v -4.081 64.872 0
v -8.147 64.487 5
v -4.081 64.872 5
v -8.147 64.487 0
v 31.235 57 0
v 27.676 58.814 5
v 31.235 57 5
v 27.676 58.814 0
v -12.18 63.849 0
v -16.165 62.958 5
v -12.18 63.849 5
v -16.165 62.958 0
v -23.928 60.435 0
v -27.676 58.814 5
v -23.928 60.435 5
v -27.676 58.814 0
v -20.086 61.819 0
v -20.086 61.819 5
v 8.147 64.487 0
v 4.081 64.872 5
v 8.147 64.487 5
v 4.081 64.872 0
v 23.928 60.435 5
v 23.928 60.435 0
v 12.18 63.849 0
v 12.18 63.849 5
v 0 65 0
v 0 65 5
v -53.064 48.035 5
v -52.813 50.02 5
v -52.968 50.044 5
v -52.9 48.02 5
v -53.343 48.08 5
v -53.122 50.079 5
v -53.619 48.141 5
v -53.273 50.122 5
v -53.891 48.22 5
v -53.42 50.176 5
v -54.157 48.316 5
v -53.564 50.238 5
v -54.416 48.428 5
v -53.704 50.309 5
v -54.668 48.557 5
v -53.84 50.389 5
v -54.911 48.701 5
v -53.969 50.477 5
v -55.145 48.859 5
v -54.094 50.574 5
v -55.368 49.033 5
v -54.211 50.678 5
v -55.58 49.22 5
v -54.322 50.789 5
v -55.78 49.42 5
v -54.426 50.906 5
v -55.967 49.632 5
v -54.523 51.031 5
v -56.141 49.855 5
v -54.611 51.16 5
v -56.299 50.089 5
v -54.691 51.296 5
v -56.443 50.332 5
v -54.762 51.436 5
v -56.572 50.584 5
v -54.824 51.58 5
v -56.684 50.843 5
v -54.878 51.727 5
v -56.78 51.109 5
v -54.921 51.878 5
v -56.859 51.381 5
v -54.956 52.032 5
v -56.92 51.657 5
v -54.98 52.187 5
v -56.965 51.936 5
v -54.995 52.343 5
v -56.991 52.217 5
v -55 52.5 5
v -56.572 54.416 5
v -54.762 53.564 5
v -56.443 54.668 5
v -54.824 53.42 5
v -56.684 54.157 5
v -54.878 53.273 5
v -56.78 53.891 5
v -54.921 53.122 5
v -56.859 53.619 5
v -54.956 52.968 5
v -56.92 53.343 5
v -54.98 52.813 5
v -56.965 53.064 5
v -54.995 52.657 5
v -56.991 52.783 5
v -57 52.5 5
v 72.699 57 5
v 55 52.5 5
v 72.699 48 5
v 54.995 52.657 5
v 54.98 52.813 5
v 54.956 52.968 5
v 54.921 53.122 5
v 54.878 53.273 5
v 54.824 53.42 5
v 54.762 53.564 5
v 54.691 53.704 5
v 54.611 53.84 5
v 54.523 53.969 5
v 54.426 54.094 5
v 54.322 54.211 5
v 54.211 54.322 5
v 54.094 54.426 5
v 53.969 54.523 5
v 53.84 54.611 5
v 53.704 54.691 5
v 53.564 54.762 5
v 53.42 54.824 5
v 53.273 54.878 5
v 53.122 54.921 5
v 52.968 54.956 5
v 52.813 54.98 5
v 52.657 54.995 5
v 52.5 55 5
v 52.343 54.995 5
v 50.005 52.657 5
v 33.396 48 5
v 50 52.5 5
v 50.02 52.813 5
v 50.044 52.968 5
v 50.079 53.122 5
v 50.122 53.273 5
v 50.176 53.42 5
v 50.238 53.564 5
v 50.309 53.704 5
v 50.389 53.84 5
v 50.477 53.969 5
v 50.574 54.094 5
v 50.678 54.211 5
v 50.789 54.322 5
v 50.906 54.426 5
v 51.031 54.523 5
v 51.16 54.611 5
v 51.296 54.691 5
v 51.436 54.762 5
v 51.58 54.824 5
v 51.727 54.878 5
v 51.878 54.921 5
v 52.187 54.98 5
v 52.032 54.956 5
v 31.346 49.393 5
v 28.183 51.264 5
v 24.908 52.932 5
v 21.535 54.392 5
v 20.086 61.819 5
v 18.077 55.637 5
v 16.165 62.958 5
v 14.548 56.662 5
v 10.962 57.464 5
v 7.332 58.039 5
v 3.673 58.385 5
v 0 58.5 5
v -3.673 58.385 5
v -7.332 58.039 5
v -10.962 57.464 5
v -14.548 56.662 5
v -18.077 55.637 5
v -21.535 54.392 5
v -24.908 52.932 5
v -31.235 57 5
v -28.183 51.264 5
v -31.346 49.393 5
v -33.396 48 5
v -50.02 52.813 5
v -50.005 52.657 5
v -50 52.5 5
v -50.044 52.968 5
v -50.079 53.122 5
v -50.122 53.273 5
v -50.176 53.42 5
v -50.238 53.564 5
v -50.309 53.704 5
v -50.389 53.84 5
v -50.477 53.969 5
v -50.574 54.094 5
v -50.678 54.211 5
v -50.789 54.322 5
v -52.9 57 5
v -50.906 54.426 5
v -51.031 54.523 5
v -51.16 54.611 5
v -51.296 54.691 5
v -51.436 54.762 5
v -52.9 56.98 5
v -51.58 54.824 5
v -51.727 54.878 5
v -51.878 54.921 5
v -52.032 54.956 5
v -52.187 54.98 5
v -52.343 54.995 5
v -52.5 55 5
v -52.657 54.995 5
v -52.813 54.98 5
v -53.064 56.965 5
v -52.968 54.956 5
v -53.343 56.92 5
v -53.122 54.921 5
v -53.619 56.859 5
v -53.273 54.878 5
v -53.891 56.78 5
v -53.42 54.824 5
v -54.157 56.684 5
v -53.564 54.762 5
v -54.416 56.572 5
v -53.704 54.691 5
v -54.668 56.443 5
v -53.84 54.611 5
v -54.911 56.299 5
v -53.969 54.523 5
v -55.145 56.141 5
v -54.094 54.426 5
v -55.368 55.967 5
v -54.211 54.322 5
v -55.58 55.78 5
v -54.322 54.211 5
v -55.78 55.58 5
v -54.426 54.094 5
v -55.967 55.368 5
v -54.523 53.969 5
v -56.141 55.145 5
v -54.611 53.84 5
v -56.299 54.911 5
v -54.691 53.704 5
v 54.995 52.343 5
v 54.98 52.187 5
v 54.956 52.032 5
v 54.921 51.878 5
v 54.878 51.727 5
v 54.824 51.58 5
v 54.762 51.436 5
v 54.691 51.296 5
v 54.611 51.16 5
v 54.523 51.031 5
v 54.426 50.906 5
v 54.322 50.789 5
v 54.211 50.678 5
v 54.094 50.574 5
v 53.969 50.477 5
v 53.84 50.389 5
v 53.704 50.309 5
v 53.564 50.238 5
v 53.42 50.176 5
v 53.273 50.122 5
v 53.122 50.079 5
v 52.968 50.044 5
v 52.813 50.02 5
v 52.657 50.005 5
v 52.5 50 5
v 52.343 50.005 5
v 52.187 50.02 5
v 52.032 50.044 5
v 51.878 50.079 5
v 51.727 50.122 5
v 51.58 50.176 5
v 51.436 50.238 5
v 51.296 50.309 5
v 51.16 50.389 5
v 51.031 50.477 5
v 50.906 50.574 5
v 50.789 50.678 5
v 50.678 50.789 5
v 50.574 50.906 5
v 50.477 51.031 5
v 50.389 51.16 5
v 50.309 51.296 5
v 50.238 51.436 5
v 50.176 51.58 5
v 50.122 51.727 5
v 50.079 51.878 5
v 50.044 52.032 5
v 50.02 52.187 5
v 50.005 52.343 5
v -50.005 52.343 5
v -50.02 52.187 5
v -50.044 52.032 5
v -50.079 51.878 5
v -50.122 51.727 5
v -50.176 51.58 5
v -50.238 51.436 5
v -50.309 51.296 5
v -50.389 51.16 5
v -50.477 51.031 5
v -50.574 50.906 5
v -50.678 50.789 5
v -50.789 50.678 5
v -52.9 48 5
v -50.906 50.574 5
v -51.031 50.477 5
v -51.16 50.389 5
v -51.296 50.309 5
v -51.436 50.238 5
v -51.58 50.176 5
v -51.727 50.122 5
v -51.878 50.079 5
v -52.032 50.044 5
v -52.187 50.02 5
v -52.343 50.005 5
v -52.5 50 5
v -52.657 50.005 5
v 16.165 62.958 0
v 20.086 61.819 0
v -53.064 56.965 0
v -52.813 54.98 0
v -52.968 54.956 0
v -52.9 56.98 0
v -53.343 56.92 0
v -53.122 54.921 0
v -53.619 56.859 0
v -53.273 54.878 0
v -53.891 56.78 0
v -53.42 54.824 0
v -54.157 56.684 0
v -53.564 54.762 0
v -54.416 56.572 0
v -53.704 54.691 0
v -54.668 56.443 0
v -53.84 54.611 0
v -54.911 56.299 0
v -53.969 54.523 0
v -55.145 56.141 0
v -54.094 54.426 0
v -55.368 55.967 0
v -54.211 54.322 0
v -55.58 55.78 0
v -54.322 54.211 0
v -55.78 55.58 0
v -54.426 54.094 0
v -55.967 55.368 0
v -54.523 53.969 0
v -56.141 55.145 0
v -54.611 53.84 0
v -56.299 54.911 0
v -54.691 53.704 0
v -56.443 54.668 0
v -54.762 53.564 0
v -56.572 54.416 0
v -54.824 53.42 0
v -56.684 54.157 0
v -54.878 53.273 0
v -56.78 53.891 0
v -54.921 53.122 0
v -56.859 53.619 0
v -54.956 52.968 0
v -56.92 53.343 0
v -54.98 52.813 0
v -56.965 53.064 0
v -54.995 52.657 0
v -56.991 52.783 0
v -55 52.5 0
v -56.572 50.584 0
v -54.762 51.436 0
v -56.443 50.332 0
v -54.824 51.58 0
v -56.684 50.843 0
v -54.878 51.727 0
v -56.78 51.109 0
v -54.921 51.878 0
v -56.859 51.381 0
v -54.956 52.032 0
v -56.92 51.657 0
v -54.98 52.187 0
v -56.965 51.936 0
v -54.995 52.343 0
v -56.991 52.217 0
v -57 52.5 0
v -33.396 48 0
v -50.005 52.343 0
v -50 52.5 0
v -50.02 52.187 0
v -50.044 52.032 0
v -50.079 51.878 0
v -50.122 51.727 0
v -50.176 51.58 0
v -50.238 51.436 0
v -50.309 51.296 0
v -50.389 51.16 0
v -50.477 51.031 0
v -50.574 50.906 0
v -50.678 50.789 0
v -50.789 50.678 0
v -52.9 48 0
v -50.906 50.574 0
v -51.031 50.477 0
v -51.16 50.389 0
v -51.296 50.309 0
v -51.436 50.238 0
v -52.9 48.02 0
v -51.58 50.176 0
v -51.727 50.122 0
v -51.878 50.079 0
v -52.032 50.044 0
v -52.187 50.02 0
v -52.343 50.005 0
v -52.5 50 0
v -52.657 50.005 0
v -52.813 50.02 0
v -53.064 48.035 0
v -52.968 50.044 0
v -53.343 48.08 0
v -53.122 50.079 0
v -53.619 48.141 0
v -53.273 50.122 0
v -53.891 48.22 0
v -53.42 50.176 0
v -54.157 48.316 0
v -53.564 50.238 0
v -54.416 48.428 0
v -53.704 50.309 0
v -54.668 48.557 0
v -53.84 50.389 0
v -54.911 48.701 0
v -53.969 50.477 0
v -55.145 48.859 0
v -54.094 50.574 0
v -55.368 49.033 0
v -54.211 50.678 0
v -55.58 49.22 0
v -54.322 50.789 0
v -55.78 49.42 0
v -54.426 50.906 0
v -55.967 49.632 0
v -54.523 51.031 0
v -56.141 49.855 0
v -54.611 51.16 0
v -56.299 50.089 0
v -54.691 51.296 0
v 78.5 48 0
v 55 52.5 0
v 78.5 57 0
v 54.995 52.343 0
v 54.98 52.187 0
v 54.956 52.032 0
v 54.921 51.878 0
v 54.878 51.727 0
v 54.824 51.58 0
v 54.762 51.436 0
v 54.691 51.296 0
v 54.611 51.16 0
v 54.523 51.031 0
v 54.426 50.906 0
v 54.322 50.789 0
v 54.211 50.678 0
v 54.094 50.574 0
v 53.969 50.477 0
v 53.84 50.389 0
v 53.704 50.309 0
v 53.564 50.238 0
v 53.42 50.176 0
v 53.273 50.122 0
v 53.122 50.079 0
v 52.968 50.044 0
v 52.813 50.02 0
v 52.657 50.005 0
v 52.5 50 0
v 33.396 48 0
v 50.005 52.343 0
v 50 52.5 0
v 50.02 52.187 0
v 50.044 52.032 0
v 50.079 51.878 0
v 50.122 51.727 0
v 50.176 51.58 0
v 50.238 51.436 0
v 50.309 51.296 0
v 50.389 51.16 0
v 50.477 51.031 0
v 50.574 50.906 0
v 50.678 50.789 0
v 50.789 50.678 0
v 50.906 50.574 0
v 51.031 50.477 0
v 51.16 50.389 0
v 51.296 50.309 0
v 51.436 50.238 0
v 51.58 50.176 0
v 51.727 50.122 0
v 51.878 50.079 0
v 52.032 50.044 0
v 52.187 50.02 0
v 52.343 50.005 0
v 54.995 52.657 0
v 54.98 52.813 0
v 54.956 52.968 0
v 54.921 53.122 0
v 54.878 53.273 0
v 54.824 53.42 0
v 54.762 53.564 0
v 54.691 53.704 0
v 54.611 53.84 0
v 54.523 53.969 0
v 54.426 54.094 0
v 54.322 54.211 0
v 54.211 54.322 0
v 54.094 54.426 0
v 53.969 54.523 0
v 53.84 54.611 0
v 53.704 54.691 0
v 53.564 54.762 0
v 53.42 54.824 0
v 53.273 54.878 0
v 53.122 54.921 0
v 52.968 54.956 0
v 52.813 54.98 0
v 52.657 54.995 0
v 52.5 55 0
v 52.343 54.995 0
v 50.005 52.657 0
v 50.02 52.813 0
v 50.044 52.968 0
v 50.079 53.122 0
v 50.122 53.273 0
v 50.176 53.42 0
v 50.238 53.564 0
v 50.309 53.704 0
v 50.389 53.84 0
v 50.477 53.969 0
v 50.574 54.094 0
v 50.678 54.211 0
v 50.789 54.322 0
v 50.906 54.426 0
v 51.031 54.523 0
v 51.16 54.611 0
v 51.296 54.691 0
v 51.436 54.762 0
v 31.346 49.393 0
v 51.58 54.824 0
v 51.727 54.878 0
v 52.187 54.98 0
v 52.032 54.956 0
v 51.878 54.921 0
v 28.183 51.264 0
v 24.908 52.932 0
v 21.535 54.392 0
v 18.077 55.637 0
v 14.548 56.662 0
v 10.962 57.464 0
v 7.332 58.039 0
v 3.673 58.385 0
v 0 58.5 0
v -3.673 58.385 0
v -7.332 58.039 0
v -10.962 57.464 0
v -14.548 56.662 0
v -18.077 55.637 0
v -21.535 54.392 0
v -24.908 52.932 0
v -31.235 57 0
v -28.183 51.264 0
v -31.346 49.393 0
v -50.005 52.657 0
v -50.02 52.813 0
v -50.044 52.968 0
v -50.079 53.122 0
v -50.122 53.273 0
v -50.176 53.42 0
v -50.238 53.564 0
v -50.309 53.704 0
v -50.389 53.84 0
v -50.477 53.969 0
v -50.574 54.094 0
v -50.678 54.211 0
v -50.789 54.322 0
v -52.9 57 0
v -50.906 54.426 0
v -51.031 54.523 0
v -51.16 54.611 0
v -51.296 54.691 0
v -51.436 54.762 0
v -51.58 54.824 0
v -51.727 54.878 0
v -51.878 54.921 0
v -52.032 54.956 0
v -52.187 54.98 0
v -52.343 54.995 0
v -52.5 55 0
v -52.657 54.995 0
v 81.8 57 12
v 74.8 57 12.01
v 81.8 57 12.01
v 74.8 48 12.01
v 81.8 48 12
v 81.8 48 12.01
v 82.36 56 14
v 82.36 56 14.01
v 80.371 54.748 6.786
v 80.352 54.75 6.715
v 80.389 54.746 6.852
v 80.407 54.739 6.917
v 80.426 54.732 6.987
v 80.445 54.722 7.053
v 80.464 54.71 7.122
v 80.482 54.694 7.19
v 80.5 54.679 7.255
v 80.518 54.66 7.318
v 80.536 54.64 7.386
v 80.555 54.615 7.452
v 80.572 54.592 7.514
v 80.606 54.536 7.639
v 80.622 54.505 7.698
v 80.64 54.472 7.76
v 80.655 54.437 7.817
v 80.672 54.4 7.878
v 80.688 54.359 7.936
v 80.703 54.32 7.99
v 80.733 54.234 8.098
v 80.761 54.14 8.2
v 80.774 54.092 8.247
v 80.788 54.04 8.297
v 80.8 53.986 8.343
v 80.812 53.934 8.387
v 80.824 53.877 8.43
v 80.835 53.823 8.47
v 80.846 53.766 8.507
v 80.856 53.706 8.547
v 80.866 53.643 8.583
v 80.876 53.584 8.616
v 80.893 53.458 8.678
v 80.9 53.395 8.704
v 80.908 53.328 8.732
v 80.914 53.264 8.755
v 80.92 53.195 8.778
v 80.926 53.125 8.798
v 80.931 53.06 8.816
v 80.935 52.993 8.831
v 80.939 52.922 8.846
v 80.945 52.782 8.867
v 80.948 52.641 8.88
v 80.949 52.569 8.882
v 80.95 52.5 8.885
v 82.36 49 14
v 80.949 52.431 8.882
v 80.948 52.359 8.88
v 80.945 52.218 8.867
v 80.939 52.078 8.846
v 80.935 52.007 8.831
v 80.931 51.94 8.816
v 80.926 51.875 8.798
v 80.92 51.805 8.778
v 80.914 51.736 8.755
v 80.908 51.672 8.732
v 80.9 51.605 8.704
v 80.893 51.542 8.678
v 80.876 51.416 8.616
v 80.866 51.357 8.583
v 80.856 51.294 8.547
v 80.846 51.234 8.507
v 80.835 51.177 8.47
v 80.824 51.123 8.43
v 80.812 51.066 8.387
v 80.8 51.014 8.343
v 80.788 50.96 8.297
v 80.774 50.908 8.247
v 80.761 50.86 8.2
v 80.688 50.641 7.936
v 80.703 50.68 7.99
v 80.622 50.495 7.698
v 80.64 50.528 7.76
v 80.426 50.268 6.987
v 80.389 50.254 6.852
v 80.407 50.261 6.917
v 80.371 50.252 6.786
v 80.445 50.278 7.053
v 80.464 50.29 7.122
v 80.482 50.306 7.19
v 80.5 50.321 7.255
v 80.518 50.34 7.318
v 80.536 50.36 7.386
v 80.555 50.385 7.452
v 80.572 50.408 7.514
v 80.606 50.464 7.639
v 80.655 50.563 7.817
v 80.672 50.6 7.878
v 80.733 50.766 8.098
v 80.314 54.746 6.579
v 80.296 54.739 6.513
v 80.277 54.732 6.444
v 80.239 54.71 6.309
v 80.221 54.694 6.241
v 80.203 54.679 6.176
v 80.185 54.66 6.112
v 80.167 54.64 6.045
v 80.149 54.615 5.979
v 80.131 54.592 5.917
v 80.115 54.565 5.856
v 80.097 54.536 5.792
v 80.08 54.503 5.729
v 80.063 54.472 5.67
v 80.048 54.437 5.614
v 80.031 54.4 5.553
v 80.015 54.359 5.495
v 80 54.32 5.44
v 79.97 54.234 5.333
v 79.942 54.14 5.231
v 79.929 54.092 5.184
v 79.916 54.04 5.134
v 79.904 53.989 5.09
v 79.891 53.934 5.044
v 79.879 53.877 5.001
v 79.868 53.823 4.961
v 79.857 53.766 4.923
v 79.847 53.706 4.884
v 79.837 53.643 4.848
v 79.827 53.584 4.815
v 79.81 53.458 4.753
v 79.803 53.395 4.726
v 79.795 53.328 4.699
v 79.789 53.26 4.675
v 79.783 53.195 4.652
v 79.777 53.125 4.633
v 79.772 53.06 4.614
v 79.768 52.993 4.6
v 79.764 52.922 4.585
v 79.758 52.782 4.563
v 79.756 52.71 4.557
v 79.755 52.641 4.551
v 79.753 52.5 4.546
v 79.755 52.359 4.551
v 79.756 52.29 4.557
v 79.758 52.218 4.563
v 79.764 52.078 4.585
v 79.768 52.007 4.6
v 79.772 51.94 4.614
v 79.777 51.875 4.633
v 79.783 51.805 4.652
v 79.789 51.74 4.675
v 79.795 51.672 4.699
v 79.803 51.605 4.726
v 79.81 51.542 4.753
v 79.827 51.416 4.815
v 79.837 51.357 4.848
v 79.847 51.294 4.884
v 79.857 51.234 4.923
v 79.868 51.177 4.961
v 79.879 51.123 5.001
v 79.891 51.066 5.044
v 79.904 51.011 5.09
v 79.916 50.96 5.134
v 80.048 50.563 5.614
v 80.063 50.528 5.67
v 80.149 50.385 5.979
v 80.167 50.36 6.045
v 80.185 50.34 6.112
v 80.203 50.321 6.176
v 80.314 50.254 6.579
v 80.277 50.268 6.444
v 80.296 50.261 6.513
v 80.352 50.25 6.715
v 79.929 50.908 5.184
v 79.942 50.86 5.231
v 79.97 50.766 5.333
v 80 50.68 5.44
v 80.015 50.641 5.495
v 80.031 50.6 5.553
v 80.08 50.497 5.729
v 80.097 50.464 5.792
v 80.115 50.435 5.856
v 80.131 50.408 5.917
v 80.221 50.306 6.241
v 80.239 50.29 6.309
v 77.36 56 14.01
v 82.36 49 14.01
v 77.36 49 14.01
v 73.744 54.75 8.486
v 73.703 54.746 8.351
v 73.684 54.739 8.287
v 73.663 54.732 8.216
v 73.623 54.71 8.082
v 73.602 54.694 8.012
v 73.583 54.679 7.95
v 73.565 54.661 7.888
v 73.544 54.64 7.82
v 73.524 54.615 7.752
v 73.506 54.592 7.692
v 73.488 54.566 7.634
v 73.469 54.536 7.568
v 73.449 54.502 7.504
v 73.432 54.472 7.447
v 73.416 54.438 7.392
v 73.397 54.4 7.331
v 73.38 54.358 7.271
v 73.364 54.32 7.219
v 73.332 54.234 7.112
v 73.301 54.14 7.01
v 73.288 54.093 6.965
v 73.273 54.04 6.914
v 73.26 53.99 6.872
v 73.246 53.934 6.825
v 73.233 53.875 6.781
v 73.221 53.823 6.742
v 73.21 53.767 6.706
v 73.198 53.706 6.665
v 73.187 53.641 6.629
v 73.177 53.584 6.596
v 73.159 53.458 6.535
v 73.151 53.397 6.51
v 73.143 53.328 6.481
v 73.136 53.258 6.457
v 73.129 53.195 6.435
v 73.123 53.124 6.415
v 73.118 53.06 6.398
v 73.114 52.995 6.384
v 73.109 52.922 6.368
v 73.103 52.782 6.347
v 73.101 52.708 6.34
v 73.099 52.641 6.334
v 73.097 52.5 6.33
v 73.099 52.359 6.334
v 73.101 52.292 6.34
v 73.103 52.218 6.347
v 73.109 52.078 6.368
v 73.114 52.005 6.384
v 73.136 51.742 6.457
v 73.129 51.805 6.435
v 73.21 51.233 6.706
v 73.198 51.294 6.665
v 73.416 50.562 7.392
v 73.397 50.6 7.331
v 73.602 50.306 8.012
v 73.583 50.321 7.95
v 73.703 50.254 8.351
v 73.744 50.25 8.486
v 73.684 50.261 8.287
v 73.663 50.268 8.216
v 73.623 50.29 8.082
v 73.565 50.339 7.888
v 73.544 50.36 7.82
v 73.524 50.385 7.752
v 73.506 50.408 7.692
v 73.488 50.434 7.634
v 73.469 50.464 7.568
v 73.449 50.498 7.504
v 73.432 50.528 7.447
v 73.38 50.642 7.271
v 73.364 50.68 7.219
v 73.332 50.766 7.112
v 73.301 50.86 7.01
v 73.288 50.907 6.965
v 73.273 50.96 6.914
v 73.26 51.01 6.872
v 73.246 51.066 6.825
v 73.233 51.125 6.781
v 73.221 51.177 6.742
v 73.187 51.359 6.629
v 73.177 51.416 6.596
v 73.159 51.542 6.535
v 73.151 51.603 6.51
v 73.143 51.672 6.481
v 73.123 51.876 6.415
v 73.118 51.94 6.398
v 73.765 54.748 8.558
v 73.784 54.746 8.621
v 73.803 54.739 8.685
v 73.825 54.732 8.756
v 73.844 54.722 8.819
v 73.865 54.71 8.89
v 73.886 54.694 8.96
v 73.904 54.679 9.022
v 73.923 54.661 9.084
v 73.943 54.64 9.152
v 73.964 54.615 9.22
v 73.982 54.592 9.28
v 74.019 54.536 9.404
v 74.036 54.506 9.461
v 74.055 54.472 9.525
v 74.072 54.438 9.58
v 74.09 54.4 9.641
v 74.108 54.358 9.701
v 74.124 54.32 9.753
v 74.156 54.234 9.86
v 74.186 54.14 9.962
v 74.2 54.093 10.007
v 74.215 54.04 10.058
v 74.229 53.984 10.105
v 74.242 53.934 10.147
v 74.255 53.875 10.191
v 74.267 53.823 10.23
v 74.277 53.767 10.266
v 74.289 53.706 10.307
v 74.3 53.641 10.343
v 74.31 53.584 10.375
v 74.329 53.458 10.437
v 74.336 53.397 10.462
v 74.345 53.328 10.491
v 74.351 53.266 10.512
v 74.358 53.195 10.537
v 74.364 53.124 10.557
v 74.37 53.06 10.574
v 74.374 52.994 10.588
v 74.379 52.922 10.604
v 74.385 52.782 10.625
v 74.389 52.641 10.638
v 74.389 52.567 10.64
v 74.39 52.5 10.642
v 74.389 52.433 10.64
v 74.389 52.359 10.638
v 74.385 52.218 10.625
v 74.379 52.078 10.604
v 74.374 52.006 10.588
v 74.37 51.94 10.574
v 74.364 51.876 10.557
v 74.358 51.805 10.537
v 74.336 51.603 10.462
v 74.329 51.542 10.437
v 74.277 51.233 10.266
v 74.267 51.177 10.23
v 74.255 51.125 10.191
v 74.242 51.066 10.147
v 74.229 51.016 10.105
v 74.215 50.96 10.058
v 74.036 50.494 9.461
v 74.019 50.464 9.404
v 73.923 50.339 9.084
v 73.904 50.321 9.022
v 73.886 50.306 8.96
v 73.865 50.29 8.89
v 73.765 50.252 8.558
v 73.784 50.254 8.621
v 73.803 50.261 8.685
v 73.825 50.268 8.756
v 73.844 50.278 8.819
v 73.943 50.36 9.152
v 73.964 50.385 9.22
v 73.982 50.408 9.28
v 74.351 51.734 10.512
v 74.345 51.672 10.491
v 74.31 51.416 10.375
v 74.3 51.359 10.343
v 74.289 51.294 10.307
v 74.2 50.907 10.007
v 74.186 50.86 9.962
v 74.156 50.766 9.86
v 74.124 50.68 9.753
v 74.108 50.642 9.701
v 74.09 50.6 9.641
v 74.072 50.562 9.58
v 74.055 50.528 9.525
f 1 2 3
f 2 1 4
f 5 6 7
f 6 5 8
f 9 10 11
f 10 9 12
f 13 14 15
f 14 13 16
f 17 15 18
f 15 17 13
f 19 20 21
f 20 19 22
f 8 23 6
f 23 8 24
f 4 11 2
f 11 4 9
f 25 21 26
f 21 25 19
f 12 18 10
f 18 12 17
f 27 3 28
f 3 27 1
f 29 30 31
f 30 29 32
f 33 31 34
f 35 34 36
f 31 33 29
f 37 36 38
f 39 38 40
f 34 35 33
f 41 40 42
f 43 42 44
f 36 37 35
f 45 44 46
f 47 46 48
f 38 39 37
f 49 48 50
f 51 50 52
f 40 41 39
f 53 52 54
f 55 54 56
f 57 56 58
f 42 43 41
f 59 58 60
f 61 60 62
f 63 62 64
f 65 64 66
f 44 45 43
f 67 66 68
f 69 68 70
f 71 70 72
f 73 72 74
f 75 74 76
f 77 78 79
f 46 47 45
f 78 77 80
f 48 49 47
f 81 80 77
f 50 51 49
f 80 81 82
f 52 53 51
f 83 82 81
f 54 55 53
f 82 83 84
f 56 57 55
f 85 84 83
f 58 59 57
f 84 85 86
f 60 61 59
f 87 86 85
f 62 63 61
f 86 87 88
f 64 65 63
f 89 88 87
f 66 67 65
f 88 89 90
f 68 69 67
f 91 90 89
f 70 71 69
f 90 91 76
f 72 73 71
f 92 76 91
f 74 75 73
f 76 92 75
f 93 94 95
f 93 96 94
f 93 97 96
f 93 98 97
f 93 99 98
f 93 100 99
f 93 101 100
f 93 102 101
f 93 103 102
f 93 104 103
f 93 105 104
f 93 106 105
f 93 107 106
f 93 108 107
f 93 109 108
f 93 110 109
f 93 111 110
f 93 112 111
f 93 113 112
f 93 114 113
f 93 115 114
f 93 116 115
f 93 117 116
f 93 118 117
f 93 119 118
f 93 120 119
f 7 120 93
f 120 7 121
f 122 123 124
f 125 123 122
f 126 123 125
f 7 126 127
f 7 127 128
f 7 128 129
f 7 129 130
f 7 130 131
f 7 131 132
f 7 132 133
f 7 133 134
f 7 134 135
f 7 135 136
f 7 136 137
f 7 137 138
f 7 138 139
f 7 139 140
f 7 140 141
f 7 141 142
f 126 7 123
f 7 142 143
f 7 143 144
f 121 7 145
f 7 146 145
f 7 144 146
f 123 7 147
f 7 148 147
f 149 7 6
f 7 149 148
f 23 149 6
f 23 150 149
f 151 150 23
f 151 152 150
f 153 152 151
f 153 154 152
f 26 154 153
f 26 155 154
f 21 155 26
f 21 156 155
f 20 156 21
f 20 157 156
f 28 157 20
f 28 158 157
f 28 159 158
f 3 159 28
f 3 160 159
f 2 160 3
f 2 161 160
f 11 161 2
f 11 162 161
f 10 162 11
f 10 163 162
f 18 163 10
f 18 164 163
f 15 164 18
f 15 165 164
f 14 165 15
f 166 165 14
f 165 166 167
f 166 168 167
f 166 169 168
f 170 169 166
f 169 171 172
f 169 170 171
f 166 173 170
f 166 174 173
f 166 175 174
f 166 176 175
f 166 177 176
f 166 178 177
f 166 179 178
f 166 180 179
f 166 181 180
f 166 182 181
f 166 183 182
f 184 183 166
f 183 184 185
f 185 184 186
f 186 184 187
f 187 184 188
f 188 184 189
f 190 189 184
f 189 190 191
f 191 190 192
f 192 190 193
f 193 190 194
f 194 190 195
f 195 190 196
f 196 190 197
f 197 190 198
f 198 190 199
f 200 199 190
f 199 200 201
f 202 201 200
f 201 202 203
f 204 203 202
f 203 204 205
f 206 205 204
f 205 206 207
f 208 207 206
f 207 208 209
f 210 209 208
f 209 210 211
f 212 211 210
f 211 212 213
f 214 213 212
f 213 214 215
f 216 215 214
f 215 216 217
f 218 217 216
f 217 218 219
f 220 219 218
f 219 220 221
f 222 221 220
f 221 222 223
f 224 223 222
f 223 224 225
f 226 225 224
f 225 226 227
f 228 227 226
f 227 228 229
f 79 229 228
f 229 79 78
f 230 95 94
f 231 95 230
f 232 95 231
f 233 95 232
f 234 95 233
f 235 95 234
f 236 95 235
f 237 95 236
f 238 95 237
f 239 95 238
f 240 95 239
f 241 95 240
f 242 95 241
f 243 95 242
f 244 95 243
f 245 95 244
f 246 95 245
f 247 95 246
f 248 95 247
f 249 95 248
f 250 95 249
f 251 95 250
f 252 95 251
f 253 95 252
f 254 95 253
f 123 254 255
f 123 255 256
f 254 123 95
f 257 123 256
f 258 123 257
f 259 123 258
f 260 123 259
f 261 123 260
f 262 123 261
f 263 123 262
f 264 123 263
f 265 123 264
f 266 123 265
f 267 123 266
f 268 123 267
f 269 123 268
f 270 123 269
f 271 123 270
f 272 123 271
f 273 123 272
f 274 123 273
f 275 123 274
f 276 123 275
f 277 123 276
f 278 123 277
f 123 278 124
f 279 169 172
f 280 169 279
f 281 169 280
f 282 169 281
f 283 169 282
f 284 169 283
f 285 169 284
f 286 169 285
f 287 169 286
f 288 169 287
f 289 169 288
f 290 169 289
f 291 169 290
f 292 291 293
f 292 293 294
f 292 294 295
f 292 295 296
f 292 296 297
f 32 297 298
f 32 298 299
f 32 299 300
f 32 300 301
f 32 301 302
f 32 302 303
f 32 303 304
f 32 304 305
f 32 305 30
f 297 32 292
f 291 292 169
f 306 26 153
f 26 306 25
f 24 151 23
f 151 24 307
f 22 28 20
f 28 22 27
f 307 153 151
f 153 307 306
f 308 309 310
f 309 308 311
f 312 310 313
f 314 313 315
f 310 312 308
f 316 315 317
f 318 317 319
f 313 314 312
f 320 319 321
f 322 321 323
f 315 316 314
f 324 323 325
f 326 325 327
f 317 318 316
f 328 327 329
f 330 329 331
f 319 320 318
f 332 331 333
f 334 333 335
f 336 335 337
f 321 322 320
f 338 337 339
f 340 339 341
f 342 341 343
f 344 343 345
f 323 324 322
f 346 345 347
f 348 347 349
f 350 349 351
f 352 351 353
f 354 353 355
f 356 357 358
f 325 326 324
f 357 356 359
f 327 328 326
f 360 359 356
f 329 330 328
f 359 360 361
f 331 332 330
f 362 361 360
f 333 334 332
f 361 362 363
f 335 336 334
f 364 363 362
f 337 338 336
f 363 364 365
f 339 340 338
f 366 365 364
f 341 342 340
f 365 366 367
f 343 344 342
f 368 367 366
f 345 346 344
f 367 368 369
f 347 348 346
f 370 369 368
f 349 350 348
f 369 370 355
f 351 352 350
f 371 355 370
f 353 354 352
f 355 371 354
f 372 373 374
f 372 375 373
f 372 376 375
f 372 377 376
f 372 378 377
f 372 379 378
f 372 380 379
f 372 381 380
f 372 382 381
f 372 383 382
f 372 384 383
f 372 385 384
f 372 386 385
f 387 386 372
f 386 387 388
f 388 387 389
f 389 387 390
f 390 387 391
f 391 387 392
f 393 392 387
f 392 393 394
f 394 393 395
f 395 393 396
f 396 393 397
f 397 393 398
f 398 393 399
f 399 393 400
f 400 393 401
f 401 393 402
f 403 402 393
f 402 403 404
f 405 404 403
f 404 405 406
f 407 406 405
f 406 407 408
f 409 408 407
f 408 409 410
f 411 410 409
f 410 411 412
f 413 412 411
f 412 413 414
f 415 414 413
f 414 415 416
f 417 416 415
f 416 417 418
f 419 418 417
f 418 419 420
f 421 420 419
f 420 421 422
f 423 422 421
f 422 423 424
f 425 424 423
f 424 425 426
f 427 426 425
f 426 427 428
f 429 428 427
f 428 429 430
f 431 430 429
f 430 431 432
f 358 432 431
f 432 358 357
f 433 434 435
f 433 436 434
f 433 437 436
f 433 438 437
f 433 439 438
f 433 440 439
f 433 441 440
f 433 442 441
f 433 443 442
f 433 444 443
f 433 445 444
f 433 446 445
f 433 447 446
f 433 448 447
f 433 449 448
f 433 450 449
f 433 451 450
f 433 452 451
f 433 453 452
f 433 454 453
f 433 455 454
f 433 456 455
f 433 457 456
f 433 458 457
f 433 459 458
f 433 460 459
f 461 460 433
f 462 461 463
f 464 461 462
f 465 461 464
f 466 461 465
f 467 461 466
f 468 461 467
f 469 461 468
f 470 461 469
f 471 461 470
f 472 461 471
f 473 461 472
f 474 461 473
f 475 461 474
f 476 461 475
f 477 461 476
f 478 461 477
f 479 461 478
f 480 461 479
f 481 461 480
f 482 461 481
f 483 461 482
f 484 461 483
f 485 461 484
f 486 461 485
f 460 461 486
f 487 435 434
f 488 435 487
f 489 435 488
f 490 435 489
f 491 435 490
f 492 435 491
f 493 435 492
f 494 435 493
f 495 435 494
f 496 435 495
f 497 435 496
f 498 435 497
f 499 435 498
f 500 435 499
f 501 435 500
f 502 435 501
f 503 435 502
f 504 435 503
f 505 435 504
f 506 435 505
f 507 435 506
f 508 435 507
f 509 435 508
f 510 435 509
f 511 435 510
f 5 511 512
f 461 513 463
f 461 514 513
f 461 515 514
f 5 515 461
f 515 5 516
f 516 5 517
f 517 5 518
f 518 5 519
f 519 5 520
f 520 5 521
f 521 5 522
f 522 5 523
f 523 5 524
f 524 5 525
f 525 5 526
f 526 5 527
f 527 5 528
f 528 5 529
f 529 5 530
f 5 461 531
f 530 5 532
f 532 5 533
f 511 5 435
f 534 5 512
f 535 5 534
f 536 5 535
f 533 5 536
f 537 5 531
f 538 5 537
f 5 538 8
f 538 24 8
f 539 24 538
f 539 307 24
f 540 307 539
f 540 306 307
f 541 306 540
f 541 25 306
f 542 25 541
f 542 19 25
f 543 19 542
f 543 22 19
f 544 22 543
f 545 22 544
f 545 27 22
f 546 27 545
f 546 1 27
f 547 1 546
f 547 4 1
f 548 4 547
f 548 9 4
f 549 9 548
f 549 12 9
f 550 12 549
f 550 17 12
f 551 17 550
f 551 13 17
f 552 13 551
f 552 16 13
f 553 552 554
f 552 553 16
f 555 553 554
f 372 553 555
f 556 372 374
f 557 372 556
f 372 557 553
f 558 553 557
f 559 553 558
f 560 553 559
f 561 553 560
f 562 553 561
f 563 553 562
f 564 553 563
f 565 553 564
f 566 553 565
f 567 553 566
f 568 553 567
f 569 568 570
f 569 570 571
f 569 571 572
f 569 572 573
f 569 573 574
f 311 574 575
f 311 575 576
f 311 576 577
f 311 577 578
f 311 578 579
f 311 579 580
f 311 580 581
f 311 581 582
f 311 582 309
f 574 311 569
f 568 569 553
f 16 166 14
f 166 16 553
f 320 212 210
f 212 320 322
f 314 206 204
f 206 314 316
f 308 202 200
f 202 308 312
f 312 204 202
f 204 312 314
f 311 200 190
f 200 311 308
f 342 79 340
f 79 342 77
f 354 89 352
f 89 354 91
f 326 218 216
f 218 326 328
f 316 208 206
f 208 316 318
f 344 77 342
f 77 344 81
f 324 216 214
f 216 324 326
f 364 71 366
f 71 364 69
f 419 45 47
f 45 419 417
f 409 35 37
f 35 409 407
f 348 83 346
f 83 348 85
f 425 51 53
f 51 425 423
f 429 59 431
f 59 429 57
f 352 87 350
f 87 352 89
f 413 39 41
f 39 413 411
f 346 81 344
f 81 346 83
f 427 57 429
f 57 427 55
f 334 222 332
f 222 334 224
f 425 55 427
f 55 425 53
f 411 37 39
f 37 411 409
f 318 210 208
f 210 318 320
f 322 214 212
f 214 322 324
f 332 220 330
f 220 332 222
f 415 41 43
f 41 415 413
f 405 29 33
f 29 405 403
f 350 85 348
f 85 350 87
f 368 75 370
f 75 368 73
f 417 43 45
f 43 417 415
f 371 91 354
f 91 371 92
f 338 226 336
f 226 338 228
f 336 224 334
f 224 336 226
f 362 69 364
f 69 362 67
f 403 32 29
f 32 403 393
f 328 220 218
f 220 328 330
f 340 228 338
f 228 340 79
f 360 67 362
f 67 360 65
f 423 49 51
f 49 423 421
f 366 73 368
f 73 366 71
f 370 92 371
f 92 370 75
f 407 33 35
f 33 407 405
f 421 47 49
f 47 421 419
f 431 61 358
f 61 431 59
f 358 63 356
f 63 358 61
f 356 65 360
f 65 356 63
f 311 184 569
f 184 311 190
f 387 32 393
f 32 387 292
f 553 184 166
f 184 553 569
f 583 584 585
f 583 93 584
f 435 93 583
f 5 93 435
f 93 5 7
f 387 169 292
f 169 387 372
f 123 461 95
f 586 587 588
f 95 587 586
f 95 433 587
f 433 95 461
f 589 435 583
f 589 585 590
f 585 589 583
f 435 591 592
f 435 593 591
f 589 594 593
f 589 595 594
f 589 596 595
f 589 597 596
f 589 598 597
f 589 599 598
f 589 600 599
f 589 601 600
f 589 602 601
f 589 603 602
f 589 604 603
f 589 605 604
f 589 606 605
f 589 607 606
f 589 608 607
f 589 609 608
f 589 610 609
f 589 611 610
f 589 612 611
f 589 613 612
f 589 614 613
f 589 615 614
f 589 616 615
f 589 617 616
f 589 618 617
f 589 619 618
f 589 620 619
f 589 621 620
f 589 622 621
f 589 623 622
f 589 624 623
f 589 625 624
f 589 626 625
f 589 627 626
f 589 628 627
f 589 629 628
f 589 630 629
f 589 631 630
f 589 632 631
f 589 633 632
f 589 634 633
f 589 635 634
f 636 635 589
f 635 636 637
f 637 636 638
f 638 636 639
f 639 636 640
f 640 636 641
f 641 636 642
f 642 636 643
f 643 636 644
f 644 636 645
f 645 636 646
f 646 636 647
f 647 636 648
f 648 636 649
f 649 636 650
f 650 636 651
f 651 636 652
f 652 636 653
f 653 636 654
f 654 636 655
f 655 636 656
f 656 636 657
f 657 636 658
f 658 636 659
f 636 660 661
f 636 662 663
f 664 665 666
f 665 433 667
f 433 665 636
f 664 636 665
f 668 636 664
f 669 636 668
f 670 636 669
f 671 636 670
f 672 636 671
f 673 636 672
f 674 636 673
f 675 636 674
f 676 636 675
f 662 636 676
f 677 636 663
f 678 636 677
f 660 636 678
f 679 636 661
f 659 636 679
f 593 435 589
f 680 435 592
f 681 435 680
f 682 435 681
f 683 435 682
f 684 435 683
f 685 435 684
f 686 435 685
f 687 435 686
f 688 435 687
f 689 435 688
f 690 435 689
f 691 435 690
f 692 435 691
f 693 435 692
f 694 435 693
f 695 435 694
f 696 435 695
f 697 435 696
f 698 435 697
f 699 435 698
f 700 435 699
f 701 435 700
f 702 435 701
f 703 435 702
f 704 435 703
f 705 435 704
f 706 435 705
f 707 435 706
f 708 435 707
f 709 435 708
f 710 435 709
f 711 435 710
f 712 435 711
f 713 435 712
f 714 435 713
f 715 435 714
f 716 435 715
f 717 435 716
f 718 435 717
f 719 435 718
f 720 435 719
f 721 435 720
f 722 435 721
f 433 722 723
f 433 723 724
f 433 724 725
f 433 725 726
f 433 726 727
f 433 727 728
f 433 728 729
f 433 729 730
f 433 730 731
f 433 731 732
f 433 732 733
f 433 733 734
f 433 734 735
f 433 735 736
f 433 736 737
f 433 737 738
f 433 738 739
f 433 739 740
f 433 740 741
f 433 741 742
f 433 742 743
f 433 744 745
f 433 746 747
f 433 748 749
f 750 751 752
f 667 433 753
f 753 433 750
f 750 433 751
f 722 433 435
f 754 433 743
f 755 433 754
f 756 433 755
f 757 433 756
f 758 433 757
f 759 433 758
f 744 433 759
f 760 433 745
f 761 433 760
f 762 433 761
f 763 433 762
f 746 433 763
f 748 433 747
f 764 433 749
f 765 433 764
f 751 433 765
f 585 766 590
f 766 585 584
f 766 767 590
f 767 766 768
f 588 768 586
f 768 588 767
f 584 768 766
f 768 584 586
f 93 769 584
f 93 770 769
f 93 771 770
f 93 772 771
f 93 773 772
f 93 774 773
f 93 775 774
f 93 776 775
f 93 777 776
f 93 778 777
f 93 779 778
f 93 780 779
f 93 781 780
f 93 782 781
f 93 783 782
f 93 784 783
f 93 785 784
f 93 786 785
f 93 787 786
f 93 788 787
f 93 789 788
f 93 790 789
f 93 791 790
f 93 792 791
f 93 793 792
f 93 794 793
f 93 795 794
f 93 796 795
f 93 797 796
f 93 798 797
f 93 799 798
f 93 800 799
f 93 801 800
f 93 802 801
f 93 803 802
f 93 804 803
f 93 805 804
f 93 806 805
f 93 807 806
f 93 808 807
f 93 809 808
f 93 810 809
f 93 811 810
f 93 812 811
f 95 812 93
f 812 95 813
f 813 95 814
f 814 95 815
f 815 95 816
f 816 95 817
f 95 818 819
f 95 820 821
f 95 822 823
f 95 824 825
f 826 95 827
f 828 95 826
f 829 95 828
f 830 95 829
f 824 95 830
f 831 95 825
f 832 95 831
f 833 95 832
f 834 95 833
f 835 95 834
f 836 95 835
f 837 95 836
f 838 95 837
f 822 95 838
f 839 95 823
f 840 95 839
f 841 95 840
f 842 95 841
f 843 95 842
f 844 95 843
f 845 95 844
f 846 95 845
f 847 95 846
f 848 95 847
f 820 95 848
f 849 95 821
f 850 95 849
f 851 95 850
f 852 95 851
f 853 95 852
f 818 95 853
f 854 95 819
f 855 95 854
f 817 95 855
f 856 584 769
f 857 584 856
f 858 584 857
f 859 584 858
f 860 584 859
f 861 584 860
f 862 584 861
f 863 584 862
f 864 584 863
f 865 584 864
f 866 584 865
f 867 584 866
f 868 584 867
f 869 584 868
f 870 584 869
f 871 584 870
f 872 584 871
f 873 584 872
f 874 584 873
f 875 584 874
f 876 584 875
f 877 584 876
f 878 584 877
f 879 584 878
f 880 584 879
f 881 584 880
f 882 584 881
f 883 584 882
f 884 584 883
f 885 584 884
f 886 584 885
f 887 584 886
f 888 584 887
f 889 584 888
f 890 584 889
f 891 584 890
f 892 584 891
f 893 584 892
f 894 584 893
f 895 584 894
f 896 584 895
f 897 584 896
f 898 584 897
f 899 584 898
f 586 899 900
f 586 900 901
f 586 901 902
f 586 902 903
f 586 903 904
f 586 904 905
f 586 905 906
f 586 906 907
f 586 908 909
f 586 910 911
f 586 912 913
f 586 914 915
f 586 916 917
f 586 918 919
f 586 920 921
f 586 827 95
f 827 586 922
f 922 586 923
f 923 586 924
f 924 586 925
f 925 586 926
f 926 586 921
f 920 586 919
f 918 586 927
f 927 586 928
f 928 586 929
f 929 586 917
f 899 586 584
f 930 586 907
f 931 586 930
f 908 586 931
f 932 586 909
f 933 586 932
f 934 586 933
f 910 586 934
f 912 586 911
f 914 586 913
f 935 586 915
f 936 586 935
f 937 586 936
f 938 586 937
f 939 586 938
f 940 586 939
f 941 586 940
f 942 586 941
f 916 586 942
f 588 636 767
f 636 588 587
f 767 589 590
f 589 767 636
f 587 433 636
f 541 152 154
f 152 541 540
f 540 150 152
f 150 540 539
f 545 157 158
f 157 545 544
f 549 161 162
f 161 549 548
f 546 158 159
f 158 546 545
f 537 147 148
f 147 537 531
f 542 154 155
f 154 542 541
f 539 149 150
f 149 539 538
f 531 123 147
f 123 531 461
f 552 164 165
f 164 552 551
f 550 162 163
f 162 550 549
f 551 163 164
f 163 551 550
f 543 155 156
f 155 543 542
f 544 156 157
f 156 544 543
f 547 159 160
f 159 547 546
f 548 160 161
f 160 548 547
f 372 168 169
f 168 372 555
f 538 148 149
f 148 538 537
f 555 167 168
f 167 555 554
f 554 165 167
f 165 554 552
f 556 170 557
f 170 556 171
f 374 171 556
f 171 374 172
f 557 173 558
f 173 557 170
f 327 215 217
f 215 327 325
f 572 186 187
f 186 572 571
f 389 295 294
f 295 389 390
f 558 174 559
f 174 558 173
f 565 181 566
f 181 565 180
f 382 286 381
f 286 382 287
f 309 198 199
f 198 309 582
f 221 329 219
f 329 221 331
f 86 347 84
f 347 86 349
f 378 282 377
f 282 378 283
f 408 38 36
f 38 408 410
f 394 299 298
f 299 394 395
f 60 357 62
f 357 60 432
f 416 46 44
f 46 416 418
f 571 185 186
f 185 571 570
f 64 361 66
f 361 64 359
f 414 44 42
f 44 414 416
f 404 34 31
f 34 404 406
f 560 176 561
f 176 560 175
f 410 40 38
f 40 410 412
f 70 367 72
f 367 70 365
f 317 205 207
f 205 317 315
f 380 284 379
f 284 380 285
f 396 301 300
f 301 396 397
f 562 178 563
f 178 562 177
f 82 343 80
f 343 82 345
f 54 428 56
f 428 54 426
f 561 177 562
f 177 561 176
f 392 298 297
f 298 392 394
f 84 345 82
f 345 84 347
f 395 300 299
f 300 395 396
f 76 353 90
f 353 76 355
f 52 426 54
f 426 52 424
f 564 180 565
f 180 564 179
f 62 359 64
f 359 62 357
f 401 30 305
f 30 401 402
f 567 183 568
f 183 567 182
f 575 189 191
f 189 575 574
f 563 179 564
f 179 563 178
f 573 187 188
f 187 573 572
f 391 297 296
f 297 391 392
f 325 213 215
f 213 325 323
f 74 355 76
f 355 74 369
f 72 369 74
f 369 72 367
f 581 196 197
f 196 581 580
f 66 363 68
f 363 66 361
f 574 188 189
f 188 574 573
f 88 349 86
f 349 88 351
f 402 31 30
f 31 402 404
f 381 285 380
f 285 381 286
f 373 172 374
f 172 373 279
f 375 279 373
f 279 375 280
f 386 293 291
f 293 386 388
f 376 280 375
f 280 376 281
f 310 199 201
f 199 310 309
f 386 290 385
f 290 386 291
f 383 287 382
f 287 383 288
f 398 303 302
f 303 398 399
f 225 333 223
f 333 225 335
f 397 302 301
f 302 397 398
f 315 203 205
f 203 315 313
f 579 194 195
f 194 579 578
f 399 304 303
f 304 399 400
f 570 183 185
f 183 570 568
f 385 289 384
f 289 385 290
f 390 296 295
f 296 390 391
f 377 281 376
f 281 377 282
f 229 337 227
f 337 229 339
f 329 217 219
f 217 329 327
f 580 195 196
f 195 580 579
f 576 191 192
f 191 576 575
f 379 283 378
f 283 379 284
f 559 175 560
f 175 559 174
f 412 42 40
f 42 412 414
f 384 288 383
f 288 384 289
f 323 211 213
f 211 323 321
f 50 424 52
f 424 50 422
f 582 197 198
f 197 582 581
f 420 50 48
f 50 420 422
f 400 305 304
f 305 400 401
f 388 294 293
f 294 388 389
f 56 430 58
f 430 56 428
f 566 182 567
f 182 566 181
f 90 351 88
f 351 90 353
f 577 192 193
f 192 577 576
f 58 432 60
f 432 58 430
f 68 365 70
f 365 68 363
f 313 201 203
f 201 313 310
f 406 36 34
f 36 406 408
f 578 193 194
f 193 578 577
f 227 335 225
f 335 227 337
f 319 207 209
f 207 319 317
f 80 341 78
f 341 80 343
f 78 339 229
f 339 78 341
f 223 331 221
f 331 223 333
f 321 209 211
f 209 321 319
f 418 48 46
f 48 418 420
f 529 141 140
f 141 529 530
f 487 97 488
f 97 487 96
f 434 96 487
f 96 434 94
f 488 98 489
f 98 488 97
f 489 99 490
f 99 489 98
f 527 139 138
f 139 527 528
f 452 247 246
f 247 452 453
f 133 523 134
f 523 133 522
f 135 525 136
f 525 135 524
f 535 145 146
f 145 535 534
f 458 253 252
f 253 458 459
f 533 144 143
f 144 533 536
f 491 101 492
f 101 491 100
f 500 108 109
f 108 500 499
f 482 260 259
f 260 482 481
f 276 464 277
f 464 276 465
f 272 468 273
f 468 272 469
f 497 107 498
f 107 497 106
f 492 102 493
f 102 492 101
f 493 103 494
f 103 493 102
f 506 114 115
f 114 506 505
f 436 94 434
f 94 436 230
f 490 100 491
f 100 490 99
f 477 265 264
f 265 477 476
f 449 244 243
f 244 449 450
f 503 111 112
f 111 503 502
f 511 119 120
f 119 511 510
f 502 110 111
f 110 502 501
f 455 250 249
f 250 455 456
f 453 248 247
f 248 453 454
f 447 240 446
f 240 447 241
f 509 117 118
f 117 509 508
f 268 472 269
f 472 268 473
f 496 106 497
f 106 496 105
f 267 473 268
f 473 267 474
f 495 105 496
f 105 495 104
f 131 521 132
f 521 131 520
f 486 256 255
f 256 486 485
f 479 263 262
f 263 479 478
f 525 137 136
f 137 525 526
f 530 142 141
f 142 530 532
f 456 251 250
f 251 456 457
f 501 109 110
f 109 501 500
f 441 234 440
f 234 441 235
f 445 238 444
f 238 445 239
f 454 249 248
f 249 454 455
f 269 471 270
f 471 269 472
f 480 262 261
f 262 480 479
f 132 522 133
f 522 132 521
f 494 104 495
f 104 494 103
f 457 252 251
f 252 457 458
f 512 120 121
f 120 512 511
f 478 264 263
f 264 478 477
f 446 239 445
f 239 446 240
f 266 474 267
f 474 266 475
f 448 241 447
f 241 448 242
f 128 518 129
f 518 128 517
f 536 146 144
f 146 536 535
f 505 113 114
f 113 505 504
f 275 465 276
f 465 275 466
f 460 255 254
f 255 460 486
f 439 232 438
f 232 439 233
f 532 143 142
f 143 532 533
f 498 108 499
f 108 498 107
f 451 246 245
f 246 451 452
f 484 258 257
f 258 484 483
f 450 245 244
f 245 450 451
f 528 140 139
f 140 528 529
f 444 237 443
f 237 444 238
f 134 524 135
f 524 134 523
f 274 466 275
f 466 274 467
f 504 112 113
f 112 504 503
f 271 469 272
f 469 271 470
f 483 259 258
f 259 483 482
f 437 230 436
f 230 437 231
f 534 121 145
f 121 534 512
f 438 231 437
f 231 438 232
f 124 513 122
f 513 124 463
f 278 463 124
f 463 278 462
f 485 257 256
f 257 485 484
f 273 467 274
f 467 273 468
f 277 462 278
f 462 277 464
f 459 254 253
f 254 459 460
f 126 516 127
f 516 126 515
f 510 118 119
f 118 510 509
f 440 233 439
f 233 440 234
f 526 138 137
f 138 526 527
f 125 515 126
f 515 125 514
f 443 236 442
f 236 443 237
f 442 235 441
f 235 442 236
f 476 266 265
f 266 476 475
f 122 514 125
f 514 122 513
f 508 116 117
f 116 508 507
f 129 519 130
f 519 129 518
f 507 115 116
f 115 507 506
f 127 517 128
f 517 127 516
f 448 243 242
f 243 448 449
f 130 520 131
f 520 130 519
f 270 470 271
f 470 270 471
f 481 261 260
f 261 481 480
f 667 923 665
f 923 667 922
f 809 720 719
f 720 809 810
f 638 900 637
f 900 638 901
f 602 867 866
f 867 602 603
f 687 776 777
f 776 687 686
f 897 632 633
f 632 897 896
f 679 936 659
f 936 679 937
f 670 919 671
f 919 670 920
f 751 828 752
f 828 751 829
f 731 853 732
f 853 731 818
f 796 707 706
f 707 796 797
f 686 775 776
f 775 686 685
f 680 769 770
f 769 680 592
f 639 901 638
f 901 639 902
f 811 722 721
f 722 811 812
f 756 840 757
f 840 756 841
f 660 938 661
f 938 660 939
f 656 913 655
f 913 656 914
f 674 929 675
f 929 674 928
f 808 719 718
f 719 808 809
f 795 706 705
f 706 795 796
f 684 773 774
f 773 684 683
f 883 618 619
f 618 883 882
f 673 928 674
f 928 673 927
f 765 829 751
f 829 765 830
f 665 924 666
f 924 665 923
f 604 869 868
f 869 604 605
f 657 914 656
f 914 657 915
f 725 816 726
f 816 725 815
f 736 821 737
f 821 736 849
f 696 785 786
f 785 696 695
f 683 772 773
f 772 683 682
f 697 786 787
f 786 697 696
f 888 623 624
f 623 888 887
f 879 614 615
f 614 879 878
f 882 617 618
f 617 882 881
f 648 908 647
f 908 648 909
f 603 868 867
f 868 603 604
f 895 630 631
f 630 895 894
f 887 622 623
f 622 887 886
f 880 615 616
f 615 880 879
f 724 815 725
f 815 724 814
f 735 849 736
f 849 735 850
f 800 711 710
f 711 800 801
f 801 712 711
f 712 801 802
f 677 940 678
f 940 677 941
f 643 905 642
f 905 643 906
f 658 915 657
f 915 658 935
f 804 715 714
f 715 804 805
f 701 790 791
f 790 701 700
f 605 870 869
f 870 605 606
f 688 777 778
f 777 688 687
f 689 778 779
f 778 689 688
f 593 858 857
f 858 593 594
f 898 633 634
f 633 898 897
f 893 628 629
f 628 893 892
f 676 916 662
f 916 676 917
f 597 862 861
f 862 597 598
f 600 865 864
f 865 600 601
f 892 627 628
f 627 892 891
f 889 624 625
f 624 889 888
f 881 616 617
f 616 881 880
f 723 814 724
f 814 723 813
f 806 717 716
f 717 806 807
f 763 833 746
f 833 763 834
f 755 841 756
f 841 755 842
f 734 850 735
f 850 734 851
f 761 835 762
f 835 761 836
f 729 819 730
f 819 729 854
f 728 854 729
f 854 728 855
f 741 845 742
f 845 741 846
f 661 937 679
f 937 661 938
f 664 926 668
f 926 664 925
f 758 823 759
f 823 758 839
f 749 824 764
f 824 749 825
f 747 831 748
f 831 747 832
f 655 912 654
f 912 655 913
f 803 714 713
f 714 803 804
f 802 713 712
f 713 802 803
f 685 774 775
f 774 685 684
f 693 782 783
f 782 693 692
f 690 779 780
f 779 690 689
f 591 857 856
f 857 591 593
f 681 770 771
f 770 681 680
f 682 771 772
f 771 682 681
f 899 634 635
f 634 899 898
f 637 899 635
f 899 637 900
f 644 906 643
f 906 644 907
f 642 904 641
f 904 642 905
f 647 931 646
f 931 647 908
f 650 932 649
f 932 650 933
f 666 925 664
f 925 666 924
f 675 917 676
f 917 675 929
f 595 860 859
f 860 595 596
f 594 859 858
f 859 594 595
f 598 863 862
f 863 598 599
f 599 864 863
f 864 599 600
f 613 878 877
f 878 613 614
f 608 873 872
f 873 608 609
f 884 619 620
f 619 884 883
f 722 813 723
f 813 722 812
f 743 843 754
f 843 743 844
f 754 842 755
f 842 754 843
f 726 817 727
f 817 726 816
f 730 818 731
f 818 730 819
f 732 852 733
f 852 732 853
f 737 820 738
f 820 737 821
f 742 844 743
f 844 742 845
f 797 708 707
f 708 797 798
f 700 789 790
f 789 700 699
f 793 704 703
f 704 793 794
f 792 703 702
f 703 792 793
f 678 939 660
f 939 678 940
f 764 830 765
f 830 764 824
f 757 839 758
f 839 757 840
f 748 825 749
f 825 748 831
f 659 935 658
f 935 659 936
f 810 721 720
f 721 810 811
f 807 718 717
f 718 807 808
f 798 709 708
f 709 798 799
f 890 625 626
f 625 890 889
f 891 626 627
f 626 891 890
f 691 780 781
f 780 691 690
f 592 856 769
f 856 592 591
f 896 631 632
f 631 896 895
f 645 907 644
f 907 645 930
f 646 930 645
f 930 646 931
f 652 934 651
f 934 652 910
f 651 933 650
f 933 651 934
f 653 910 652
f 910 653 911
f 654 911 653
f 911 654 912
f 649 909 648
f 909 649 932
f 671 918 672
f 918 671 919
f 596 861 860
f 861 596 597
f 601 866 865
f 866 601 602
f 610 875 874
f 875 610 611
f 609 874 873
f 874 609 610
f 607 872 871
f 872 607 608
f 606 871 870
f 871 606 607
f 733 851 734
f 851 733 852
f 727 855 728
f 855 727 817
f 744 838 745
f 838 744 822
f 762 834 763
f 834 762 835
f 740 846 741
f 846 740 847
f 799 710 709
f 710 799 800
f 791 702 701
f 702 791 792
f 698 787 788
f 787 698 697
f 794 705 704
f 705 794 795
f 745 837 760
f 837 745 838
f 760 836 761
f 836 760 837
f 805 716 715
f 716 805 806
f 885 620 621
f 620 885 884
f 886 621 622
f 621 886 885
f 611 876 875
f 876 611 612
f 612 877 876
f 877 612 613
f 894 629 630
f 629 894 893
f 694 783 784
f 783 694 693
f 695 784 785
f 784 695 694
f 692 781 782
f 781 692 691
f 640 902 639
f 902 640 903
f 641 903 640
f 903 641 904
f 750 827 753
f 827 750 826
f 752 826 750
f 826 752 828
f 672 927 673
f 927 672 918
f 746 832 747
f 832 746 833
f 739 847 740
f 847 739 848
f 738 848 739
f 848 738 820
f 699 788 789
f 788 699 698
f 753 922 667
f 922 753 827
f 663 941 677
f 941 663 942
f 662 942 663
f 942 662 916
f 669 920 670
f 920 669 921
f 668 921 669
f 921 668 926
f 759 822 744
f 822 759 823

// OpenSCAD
$fn = 100;

module hexagon(size, height) {
  boxWidth = size/1.75;
  hull(){
    for (r = [-60, 0, 60])
      rotate([0,0,r])
        cube([boxWidth, size, height], true);
    }
  }
  
module box(x,y,x2,y2,z){
  translate([x2,y2,z/2])
    cube([x,y,z], center=true);
  }
  
module bore(x,y,r){
  translate([x,y,0])
    cylinder(h=500, r=r,center=true);
  }
  
module bore(x,y,r){
  translate([x,y,0])
    cylinder(h=500, r=r,center=true);
  }


/**/

/**

color("silver")
  
/**/

module arm(){
  difference(){
    union(){
      translate([-105/2,105/2,2.5])
        cylinder(h=5, r=9/2,center=true);
      translate([12.6,105/2,0])
        box(131,9,0,0,5);
      translate([75,0,0])
      hull(){
        box(7,9,0,105/2,1);
        translate([0,0,12])
          hull(){
            box(7,9,3.3,105/2,0.01);
            translate([0,0,2])
              box(5,7,4.86,105/2,.01);
            }
        }
      difference(){
        translate([0,0,5/2])
          cylinder(h=5, r=130/2,center=true);
        translate([0,-19,-1])
          box(200,135,0,0,10);
        }
      }
    union(){
      cylinder(h=20, r=117/2,center=true);
      bore(-105/2,105/2,2.5);
      bore(105/2,105/2,2.5);
      translate([87.5,105/2,4.8])
      rotate([0,105,0])  
        cylinder(h=500, r=2.25,center=true);
      }
    }
  }
arm();
              
/*Half Nut Assembly
module halfNutAssembly(){
  translate([0,-(hexNutLength+hexNutSupport)/2-sides -clearance,0])
  rotate([270,270+halfNutAngle,0])
  difference(){
    union(){
      union(){
        difference(){
          rotate([0,0,-halfNutAngle])
          hull(){
            difference(){
              resize([latchHeight*2+latchTopRadius, halfNutRadius*2])
                cylinder(h=halfNutHeight, r=halfNutRadius);
              translate([-center*2,-center,-center/2])
                cube([center*2,center*3,center*3]);
              }
            difference(){
              cylinder(h=halfNutHeight, r=halfNutRadius);
              translate([0,-center,-center/2])
                cube([center*2,center*3,center*3]);
              }
            }
          union(){
            translate([0,0,center/2+sides+hexNutSupport/2])
              hexagon(hexNutWidth,hexNutLength+clearance);
            translate([0,center/2,0])
              cube([center*3,center,center*4],center=true);
            rotate([90,0,-60])
              bore(0,hexNutLength/4+sides+hexNutSupport,halfNutSetScrew);
            rotate([90,0,-60])
              bore(0,hexNutLength/4*3+sides+hexNutSupport,halfNutSetScrew);
            rotate([90,0,-60])
            translate([0,hexNutLength/4+sides+hexNutSupport,22])
              cylinder(h=15,r=halfNutSetScrew*2);
            rotate([90,0,-60])
            translate([0,hexNutLength/4*3+sides+hexNutSupport,22])
              cylinder(h=15,r=halfNutSetScrew*2);
            }
          }
        hull(){
          translate([latchHeight+latchTopRadius*2.5,0,sides+clearance])
            cylinder(h=hexNutLength+hexNutSupport, r=latchTopRadius);
          translate([latchHeight,0,sides+clearance])
            cylinder(h=hexNutLength+hexNutSupport, r=latchTopRadius);
          }
        }
      translate([latchHeight,0,sides+clearance])
        cylinder(h=hexNutLength+hexNutSupport, r=latchTopRadius);
      }
    translate([0,0,-0.01])
    hull(){
      cylinder(h=sides+clearance, r=latchRadius+clearance/2);
      translate([latchHeight,0,0])
        cylinder(h=sides+clearance, r=latchTopRadius+clearance/2);
      }
    translate([0,0,sides+center+0.01-clearance])
    hull(){
      cylinder(h=sides+clearance, r=latchRadius+clearance/2);
      translate([latchHeight,0,0])
        cylinder(h=sides+clearance, r=latchTopRadius+clearance/2);
      }
    bore(0,0,latchBore);
    //latching bore
    bore(latchHeight,0,latchTopBore);
    }
  }
halfNutAssembly();*/
